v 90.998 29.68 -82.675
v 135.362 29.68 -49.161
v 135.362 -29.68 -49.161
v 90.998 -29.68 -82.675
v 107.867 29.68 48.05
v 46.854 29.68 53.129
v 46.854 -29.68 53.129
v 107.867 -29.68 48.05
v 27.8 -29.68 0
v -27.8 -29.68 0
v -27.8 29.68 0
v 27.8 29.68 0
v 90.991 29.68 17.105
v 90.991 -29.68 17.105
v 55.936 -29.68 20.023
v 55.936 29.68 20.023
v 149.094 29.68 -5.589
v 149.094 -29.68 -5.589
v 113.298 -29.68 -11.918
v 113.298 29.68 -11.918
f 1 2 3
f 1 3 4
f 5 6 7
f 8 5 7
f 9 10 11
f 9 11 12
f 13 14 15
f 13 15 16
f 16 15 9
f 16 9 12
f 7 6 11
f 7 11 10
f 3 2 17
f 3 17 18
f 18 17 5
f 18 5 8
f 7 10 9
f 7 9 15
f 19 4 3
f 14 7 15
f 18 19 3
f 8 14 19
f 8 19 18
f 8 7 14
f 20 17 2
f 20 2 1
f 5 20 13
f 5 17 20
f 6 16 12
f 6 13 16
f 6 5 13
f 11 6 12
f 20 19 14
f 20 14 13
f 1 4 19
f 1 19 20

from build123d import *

# Parameters (mm, degrees)
F0_W = 55.5998794734
F0_H = 59.3593008816


with BuildPart() as f2:
    # F2: sweep along a path in F1
    with BuildLine(Plane.XZ) as f2_path:
        Line((0, 0), (51.3951145113, 36.5762151778))
        Line((51.3951145113, 36.5762151778), (99.4288995862, 32.5775817037))
        Line((99.4288995862, 32.5775817037), (131.1959028244, -8.7538054213))
        Line((131.1959028244, -8.7538054213), (113.1796464324, -65.9180954099))
    # F0 (on Top) → F2 (sweep)
    with BuildSketch(Plane.XY):
        Rectangle(F0_W, F0_H)
    sweep(path=f2_path.line, transition=Transition.RIGHT)


solid = f2.part
